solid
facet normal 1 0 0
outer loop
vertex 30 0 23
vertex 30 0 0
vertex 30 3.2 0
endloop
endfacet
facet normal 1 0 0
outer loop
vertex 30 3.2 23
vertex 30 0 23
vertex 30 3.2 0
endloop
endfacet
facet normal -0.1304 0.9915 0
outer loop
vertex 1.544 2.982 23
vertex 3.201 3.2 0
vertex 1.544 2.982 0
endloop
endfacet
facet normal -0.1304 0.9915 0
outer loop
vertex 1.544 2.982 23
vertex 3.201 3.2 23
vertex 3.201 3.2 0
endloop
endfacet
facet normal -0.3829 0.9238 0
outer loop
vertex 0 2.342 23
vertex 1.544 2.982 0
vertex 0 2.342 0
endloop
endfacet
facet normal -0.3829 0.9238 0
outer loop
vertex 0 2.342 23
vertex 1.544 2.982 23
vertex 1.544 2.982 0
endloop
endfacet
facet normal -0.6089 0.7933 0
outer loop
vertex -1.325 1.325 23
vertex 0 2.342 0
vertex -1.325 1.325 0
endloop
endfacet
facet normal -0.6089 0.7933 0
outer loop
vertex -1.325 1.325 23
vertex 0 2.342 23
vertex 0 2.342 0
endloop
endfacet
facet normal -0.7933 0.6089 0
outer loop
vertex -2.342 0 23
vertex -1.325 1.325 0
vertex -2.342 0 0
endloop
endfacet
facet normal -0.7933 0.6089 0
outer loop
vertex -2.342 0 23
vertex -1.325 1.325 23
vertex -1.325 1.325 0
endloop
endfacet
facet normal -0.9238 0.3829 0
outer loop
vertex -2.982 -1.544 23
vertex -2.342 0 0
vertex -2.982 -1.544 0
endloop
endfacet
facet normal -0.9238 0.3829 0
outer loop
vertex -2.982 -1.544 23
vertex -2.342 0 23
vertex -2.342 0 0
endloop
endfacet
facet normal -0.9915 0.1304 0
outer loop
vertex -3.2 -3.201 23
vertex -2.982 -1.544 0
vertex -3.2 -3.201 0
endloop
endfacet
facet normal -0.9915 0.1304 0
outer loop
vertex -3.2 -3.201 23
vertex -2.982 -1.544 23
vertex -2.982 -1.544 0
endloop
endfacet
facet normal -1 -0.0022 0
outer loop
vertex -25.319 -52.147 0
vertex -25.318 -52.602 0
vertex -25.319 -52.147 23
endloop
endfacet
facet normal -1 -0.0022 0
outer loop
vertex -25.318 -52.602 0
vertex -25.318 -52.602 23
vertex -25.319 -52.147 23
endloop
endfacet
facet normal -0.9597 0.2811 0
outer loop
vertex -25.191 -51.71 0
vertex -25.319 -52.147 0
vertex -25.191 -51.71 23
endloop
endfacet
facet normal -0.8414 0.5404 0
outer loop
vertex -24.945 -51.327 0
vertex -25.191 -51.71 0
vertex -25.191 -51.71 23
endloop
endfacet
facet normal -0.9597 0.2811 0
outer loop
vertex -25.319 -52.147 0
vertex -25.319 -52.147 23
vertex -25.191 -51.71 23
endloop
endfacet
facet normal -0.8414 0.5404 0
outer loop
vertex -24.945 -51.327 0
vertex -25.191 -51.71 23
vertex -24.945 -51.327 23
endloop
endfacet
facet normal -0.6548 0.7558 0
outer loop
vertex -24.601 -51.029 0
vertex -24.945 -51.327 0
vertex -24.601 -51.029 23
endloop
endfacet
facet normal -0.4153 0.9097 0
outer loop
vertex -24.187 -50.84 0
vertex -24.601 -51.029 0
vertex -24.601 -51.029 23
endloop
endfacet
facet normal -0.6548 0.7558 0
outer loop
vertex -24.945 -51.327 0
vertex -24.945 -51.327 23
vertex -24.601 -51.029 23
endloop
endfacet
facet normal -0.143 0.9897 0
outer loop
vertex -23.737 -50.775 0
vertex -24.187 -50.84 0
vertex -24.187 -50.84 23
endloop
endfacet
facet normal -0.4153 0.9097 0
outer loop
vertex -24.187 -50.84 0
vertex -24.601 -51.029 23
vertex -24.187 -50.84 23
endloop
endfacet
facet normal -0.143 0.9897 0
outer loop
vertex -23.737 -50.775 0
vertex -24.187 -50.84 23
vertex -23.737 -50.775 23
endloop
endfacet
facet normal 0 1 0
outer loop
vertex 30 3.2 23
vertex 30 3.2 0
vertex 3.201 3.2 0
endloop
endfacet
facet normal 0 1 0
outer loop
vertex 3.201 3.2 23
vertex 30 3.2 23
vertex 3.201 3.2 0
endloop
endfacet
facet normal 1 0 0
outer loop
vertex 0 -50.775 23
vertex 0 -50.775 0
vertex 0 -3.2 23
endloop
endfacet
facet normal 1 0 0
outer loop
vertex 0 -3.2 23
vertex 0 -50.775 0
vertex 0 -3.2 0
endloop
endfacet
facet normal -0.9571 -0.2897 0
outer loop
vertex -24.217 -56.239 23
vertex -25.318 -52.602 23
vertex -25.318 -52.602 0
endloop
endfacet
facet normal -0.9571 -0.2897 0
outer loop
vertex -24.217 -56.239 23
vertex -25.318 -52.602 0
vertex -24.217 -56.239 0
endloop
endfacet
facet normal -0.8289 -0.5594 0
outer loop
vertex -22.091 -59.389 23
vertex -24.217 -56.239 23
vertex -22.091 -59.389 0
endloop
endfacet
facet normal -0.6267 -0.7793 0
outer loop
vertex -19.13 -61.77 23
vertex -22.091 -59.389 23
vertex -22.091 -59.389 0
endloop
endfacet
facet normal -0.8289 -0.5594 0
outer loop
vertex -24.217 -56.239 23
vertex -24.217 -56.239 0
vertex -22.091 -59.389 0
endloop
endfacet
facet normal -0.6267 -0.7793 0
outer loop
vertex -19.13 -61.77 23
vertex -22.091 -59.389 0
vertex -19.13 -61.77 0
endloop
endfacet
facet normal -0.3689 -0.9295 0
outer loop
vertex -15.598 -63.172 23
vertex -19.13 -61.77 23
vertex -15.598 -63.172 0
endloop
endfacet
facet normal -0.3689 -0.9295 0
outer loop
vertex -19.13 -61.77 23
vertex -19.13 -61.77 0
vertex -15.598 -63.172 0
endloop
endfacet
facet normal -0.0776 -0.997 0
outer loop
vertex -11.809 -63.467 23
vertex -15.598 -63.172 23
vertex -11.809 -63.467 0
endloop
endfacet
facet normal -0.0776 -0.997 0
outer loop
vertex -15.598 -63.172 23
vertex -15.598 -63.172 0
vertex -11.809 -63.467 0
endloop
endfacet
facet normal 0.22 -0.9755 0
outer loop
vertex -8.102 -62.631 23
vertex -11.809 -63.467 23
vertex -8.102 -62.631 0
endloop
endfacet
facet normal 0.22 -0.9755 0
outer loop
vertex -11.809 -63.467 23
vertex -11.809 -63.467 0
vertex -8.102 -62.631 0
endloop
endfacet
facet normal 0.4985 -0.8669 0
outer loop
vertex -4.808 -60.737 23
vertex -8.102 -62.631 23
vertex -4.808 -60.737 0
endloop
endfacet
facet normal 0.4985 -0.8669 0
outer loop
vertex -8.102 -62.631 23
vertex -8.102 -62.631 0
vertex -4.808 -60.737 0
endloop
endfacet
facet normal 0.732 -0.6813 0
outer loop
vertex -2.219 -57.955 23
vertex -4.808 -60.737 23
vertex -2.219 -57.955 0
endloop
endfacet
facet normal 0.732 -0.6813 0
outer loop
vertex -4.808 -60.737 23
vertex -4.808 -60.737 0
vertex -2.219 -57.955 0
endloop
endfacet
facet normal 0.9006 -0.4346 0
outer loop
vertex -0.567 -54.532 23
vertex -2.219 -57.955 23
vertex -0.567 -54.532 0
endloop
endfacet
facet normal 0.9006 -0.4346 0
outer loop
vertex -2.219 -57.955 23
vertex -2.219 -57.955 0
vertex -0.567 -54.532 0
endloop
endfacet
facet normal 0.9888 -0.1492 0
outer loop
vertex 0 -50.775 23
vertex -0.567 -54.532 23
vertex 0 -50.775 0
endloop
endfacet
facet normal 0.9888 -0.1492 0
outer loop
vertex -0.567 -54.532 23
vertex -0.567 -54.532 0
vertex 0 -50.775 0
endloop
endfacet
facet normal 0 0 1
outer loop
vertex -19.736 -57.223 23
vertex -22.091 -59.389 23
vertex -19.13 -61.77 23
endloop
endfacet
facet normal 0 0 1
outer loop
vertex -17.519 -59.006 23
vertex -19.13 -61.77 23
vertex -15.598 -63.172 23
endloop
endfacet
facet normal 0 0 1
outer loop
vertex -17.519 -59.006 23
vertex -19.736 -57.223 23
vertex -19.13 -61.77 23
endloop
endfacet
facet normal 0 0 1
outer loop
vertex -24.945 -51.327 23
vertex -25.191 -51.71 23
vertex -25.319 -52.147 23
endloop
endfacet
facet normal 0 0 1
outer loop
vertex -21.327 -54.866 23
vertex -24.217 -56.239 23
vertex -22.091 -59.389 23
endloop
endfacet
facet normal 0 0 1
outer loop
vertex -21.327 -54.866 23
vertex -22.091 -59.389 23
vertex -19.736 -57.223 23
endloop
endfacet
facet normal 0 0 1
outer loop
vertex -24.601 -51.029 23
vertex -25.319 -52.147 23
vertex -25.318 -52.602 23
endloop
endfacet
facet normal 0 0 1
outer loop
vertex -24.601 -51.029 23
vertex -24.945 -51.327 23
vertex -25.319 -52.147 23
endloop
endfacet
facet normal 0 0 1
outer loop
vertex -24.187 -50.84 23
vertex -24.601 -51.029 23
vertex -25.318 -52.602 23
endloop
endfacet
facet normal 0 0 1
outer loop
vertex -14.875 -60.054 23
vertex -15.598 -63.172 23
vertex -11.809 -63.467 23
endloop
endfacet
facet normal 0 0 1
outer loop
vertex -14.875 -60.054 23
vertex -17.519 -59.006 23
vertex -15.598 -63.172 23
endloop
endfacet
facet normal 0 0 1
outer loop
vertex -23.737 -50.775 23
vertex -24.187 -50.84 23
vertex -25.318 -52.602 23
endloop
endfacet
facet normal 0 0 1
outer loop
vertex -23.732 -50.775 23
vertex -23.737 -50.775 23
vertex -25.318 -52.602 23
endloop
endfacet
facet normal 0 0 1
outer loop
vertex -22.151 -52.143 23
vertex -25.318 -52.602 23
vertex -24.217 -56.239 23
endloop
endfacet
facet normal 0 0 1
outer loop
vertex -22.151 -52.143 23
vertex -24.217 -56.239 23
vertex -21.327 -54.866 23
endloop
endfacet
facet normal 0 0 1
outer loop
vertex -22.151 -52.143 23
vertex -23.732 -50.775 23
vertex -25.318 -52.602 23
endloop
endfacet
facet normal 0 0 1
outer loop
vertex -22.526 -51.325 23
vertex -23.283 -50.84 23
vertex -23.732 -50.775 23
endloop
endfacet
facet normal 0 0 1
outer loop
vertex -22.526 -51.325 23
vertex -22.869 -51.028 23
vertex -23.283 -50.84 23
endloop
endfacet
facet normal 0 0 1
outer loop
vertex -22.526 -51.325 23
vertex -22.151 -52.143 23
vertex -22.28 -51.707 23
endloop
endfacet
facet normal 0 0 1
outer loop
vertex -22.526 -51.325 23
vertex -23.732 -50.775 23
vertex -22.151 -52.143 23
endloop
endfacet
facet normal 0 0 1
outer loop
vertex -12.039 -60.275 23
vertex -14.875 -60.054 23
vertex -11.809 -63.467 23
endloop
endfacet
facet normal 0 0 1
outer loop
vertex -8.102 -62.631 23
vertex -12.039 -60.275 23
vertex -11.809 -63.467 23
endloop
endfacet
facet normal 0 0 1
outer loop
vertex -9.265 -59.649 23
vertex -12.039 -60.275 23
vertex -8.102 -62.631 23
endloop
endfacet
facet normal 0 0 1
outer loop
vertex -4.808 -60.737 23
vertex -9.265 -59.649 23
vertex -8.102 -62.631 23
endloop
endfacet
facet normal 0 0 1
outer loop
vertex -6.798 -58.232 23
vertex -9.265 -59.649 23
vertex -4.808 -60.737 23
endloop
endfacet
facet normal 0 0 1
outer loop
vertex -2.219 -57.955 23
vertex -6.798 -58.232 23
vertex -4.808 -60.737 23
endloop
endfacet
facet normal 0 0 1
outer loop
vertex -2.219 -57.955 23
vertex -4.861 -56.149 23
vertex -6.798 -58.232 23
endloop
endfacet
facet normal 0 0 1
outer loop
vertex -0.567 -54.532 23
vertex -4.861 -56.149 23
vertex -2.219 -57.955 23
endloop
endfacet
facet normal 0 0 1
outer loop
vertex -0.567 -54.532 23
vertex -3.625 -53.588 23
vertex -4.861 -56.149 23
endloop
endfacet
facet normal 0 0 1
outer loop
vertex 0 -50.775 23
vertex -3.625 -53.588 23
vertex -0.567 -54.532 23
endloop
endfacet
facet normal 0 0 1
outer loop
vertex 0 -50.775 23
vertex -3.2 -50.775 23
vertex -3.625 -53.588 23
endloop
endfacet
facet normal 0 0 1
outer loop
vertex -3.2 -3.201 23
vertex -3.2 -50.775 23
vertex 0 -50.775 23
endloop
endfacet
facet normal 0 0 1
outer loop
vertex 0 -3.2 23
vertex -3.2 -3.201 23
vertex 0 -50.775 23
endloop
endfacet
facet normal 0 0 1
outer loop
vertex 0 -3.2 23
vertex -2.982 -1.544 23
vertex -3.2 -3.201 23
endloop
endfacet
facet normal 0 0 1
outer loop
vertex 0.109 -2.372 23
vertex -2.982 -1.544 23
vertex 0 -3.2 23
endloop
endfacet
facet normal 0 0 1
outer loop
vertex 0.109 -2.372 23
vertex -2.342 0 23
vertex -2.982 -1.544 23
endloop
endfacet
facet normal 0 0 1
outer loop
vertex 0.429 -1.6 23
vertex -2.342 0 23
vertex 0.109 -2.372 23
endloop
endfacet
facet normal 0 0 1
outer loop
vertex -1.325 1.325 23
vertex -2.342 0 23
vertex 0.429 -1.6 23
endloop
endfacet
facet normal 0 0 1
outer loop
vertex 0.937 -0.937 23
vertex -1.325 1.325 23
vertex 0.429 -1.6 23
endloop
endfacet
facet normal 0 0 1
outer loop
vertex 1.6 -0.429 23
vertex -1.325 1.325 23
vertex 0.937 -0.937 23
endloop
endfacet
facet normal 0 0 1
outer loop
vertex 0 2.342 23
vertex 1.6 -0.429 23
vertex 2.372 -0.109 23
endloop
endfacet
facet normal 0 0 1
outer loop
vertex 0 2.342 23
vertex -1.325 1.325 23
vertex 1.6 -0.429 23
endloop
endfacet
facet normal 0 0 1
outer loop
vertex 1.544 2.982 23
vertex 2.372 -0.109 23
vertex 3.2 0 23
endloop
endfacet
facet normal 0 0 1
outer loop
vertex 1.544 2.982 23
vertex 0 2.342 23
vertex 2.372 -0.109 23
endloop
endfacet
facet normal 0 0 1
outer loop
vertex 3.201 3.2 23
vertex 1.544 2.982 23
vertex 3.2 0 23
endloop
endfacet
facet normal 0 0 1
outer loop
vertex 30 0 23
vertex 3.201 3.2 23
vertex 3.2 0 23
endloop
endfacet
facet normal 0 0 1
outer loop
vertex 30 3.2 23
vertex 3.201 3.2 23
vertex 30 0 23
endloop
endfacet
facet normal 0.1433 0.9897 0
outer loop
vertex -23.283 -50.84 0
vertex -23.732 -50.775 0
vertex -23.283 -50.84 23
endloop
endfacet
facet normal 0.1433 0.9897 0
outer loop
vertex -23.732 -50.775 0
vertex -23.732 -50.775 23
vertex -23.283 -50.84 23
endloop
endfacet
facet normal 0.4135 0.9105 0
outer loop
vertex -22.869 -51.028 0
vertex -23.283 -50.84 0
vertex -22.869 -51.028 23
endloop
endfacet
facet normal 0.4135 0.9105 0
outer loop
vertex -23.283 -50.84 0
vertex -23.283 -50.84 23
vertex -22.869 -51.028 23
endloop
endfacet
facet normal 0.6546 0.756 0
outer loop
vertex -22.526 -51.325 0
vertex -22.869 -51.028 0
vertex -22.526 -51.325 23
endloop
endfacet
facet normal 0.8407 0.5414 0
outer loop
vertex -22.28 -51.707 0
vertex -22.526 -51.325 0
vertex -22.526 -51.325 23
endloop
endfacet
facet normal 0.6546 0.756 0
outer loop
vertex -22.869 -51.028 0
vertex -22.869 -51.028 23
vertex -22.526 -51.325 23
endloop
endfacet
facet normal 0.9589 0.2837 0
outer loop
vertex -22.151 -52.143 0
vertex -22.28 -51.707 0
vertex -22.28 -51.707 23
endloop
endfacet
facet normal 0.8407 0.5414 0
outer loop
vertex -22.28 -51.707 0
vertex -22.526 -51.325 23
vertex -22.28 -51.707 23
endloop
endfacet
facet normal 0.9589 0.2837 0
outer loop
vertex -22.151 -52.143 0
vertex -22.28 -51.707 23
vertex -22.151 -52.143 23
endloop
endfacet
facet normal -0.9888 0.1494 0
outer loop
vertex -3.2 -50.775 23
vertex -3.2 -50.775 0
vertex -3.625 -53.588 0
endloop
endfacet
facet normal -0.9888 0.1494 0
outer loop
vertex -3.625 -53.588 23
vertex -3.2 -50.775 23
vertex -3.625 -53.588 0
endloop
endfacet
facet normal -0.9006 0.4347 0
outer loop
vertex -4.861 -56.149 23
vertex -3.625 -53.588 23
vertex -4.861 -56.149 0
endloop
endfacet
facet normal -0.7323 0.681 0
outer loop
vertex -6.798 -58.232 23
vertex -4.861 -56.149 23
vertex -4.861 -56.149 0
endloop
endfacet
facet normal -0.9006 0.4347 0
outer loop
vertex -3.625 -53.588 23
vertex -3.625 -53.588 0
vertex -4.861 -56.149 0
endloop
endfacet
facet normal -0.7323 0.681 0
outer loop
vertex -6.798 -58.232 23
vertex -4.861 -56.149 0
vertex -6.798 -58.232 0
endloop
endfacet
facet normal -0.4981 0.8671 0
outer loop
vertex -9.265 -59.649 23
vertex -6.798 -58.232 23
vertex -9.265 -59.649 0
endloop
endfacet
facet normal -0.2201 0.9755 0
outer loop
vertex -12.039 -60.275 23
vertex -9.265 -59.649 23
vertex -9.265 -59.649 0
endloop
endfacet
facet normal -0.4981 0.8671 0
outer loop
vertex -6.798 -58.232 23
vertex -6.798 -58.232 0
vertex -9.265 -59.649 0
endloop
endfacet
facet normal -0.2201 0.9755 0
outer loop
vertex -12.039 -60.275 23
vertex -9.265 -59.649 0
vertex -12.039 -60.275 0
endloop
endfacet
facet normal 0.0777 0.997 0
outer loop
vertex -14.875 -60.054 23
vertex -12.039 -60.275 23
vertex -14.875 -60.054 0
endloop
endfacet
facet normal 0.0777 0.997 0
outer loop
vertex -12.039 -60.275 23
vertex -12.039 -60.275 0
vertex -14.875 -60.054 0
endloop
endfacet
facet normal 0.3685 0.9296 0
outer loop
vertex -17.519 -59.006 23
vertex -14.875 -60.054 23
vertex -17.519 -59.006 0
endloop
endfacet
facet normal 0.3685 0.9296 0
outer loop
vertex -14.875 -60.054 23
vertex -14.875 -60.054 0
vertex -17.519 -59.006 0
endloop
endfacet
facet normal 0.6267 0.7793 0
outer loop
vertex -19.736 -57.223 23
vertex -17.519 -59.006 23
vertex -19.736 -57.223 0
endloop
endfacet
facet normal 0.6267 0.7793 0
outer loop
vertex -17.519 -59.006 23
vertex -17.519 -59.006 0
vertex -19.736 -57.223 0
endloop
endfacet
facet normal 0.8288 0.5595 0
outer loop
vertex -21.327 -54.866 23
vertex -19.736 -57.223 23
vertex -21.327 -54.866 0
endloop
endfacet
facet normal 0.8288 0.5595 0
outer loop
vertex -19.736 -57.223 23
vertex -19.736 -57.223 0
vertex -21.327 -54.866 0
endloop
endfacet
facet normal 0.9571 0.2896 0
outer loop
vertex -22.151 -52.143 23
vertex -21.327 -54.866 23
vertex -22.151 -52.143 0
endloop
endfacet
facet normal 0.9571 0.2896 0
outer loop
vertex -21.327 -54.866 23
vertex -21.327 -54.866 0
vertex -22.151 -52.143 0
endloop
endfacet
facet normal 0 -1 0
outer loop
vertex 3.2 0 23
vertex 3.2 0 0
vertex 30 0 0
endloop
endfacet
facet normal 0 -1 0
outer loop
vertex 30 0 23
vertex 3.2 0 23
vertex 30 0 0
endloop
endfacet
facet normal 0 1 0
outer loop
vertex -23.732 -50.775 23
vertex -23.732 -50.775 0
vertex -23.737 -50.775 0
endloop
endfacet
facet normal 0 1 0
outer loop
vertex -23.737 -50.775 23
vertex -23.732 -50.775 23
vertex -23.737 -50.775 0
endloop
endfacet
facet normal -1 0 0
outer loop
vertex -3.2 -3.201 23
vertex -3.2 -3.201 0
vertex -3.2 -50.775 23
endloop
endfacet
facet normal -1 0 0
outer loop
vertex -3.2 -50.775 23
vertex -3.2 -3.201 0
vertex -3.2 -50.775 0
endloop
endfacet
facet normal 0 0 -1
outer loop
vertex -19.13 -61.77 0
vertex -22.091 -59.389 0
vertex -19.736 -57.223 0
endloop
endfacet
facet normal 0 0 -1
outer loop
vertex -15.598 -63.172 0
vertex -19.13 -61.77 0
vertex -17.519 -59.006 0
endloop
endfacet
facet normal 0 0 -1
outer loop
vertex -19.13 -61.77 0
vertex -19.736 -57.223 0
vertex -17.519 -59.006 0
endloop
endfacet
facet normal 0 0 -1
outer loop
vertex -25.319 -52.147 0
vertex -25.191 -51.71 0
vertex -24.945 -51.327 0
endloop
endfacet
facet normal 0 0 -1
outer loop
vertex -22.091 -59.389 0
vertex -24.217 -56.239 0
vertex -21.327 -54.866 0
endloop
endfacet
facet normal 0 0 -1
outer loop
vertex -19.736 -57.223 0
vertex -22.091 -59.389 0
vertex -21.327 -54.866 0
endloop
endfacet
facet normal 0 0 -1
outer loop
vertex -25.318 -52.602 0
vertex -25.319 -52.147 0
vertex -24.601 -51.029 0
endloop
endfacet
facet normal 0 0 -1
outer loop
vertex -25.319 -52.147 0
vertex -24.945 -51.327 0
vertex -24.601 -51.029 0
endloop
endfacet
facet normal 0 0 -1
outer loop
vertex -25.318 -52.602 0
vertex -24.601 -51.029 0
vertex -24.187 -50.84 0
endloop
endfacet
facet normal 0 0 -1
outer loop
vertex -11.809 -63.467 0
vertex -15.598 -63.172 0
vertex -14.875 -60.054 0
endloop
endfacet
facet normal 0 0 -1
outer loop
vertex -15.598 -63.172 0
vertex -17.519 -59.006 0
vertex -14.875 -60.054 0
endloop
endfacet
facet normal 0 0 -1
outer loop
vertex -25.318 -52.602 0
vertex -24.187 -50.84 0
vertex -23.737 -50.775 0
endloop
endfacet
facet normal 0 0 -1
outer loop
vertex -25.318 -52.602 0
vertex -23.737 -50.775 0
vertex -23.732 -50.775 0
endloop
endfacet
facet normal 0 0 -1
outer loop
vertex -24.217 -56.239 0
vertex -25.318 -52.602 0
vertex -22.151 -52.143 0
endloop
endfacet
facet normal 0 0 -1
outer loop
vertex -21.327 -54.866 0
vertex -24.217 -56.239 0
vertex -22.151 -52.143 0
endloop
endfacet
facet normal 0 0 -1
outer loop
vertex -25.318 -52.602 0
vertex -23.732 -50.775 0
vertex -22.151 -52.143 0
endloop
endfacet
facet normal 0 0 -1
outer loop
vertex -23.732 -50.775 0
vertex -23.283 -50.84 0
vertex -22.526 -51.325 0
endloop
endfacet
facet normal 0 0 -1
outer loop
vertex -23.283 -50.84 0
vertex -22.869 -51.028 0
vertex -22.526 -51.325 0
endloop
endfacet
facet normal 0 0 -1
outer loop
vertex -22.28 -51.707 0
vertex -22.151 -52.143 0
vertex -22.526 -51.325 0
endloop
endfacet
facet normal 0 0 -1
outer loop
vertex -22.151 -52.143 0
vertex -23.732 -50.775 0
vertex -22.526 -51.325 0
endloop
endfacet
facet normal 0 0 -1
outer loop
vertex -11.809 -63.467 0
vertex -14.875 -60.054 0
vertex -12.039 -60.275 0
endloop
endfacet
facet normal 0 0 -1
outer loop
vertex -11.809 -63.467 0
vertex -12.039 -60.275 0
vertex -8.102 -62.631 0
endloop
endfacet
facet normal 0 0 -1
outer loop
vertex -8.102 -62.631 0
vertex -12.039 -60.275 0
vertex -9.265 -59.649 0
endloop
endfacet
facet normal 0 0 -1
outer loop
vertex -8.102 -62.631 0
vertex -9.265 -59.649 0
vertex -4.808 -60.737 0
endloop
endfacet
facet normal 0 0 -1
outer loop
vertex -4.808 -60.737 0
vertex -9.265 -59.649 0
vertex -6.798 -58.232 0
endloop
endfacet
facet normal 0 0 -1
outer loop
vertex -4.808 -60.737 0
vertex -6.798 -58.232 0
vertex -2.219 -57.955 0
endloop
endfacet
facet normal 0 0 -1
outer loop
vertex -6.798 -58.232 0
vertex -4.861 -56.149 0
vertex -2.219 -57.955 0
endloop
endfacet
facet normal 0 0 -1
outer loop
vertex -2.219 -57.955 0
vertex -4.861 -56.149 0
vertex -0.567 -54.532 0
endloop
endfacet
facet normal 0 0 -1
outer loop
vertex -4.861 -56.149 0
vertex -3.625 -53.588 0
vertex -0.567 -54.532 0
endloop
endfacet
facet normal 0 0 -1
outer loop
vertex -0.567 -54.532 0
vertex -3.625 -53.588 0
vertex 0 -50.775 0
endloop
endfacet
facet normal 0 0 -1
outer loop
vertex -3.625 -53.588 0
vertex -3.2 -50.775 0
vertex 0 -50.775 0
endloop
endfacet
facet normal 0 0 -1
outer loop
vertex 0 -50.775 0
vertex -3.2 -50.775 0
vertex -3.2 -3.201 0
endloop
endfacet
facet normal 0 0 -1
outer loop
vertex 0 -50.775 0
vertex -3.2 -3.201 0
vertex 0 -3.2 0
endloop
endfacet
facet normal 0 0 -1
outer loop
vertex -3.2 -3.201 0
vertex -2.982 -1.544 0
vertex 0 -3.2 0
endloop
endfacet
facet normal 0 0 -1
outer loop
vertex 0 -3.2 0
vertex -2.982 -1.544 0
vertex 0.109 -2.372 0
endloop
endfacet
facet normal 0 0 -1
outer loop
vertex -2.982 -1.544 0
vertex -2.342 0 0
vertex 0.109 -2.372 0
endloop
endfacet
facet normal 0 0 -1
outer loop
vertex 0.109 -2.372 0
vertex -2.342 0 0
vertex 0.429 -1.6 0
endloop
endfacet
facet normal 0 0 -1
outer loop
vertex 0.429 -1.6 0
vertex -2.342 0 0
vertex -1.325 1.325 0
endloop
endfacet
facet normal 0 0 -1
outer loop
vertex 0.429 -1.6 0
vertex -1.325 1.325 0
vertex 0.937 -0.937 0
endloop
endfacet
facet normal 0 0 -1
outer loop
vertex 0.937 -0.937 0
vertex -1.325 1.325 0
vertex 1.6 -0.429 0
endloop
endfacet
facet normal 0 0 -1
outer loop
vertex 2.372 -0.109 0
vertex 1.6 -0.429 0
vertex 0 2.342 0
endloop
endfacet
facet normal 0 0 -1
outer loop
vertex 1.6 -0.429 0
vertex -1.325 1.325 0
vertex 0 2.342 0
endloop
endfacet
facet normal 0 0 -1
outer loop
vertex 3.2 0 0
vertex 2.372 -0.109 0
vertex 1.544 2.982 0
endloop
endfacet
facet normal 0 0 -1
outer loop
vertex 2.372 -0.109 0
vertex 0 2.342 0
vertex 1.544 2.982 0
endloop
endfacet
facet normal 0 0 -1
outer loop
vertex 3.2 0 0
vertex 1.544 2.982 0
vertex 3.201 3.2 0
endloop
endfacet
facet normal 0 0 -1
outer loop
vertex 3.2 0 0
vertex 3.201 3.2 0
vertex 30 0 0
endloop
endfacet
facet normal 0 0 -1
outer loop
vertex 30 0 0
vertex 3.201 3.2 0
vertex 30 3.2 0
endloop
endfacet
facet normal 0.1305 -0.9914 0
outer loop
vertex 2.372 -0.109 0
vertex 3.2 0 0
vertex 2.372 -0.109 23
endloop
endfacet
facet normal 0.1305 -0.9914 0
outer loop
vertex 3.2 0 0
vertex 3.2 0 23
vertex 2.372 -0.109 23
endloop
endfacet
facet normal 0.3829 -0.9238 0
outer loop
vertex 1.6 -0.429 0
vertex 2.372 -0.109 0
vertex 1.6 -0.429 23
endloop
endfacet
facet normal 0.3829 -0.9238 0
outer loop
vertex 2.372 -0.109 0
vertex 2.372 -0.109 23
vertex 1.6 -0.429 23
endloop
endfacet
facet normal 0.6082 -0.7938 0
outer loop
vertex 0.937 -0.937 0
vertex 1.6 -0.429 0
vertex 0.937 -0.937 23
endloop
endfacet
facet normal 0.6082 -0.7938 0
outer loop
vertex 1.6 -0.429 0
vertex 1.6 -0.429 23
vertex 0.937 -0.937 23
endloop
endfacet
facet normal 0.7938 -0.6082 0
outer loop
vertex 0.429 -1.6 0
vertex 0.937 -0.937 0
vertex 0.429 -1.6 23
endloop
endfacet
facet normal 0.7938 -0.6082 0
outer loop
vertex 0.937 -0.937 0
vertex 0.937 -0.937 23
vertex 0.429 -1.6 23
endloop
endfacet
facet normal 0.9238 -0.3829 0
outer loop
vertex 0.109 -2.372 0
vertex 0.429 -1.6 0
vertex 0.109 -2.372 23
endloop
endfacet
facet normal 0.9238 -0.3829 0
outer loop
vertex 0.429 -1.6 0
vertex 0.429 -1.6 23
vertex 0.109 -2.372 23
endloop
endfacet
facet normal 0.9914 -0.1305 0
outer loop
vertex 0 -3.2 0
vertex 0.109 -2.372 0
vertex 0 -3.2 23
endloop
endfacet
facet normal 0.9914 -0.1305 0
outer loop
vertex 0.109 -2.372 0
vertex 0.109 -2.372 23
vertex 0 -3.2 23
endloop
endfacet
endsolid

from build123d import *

# Parameters (mm, degrees)
F1_DEPTH = 23
F2_R     = 6.4008
F3_R     = 3.2004
F4_R     = 1.59766


with BuildPart() as f1:
    # F0 (on Top) → F1 (new body)
    with BuildSketch(Plane.XY):
        with BuildLine():
            Line((0, -50.775), (0, 0))
            Line((0, 0), (30, 0))
            Line((30, 0), (30, 3.2))
            Line((30, 3.2), (-3.2, 3.2))
            Line((-3.2, 3.2), (-3.2, -50.775))
            ThreePointArc((-3.2, -50.775), (-12.725, -60.3), (-22.25, -50.775))
            Line((-22.25, -50.775), (-25.45, -50.775))
            ThreePointArc((-25.45, -50.775), (-12.725, -63.5), (0, -50.775))
        make_face()
    extrude(amount=F1_DEPTH)

    # F2
    f2_edges = [f1.edges().sort_by_distance(p)[0] for p in [
        (-3.2, 3.2, 11.5),
    ]]
    fillet(f2_edges, radius=F2_R)

    # F3
    f3_edges = [f1.edges().sort_by_distance(p)[0] for p in [
        (0, 0, 11.5),
    ]]
    fillet(f3_edges, radius=F3_R)

    # F4
    f4_edges = [f1.edges().sort_by_distance(p)[0] for p in [
        (-25.45, -50.775, 11.5),
        (-22.25, -50.775, 11.5),
    ]]
    fillet(f4_edges, radius=F4_R)


solid = f1.part
